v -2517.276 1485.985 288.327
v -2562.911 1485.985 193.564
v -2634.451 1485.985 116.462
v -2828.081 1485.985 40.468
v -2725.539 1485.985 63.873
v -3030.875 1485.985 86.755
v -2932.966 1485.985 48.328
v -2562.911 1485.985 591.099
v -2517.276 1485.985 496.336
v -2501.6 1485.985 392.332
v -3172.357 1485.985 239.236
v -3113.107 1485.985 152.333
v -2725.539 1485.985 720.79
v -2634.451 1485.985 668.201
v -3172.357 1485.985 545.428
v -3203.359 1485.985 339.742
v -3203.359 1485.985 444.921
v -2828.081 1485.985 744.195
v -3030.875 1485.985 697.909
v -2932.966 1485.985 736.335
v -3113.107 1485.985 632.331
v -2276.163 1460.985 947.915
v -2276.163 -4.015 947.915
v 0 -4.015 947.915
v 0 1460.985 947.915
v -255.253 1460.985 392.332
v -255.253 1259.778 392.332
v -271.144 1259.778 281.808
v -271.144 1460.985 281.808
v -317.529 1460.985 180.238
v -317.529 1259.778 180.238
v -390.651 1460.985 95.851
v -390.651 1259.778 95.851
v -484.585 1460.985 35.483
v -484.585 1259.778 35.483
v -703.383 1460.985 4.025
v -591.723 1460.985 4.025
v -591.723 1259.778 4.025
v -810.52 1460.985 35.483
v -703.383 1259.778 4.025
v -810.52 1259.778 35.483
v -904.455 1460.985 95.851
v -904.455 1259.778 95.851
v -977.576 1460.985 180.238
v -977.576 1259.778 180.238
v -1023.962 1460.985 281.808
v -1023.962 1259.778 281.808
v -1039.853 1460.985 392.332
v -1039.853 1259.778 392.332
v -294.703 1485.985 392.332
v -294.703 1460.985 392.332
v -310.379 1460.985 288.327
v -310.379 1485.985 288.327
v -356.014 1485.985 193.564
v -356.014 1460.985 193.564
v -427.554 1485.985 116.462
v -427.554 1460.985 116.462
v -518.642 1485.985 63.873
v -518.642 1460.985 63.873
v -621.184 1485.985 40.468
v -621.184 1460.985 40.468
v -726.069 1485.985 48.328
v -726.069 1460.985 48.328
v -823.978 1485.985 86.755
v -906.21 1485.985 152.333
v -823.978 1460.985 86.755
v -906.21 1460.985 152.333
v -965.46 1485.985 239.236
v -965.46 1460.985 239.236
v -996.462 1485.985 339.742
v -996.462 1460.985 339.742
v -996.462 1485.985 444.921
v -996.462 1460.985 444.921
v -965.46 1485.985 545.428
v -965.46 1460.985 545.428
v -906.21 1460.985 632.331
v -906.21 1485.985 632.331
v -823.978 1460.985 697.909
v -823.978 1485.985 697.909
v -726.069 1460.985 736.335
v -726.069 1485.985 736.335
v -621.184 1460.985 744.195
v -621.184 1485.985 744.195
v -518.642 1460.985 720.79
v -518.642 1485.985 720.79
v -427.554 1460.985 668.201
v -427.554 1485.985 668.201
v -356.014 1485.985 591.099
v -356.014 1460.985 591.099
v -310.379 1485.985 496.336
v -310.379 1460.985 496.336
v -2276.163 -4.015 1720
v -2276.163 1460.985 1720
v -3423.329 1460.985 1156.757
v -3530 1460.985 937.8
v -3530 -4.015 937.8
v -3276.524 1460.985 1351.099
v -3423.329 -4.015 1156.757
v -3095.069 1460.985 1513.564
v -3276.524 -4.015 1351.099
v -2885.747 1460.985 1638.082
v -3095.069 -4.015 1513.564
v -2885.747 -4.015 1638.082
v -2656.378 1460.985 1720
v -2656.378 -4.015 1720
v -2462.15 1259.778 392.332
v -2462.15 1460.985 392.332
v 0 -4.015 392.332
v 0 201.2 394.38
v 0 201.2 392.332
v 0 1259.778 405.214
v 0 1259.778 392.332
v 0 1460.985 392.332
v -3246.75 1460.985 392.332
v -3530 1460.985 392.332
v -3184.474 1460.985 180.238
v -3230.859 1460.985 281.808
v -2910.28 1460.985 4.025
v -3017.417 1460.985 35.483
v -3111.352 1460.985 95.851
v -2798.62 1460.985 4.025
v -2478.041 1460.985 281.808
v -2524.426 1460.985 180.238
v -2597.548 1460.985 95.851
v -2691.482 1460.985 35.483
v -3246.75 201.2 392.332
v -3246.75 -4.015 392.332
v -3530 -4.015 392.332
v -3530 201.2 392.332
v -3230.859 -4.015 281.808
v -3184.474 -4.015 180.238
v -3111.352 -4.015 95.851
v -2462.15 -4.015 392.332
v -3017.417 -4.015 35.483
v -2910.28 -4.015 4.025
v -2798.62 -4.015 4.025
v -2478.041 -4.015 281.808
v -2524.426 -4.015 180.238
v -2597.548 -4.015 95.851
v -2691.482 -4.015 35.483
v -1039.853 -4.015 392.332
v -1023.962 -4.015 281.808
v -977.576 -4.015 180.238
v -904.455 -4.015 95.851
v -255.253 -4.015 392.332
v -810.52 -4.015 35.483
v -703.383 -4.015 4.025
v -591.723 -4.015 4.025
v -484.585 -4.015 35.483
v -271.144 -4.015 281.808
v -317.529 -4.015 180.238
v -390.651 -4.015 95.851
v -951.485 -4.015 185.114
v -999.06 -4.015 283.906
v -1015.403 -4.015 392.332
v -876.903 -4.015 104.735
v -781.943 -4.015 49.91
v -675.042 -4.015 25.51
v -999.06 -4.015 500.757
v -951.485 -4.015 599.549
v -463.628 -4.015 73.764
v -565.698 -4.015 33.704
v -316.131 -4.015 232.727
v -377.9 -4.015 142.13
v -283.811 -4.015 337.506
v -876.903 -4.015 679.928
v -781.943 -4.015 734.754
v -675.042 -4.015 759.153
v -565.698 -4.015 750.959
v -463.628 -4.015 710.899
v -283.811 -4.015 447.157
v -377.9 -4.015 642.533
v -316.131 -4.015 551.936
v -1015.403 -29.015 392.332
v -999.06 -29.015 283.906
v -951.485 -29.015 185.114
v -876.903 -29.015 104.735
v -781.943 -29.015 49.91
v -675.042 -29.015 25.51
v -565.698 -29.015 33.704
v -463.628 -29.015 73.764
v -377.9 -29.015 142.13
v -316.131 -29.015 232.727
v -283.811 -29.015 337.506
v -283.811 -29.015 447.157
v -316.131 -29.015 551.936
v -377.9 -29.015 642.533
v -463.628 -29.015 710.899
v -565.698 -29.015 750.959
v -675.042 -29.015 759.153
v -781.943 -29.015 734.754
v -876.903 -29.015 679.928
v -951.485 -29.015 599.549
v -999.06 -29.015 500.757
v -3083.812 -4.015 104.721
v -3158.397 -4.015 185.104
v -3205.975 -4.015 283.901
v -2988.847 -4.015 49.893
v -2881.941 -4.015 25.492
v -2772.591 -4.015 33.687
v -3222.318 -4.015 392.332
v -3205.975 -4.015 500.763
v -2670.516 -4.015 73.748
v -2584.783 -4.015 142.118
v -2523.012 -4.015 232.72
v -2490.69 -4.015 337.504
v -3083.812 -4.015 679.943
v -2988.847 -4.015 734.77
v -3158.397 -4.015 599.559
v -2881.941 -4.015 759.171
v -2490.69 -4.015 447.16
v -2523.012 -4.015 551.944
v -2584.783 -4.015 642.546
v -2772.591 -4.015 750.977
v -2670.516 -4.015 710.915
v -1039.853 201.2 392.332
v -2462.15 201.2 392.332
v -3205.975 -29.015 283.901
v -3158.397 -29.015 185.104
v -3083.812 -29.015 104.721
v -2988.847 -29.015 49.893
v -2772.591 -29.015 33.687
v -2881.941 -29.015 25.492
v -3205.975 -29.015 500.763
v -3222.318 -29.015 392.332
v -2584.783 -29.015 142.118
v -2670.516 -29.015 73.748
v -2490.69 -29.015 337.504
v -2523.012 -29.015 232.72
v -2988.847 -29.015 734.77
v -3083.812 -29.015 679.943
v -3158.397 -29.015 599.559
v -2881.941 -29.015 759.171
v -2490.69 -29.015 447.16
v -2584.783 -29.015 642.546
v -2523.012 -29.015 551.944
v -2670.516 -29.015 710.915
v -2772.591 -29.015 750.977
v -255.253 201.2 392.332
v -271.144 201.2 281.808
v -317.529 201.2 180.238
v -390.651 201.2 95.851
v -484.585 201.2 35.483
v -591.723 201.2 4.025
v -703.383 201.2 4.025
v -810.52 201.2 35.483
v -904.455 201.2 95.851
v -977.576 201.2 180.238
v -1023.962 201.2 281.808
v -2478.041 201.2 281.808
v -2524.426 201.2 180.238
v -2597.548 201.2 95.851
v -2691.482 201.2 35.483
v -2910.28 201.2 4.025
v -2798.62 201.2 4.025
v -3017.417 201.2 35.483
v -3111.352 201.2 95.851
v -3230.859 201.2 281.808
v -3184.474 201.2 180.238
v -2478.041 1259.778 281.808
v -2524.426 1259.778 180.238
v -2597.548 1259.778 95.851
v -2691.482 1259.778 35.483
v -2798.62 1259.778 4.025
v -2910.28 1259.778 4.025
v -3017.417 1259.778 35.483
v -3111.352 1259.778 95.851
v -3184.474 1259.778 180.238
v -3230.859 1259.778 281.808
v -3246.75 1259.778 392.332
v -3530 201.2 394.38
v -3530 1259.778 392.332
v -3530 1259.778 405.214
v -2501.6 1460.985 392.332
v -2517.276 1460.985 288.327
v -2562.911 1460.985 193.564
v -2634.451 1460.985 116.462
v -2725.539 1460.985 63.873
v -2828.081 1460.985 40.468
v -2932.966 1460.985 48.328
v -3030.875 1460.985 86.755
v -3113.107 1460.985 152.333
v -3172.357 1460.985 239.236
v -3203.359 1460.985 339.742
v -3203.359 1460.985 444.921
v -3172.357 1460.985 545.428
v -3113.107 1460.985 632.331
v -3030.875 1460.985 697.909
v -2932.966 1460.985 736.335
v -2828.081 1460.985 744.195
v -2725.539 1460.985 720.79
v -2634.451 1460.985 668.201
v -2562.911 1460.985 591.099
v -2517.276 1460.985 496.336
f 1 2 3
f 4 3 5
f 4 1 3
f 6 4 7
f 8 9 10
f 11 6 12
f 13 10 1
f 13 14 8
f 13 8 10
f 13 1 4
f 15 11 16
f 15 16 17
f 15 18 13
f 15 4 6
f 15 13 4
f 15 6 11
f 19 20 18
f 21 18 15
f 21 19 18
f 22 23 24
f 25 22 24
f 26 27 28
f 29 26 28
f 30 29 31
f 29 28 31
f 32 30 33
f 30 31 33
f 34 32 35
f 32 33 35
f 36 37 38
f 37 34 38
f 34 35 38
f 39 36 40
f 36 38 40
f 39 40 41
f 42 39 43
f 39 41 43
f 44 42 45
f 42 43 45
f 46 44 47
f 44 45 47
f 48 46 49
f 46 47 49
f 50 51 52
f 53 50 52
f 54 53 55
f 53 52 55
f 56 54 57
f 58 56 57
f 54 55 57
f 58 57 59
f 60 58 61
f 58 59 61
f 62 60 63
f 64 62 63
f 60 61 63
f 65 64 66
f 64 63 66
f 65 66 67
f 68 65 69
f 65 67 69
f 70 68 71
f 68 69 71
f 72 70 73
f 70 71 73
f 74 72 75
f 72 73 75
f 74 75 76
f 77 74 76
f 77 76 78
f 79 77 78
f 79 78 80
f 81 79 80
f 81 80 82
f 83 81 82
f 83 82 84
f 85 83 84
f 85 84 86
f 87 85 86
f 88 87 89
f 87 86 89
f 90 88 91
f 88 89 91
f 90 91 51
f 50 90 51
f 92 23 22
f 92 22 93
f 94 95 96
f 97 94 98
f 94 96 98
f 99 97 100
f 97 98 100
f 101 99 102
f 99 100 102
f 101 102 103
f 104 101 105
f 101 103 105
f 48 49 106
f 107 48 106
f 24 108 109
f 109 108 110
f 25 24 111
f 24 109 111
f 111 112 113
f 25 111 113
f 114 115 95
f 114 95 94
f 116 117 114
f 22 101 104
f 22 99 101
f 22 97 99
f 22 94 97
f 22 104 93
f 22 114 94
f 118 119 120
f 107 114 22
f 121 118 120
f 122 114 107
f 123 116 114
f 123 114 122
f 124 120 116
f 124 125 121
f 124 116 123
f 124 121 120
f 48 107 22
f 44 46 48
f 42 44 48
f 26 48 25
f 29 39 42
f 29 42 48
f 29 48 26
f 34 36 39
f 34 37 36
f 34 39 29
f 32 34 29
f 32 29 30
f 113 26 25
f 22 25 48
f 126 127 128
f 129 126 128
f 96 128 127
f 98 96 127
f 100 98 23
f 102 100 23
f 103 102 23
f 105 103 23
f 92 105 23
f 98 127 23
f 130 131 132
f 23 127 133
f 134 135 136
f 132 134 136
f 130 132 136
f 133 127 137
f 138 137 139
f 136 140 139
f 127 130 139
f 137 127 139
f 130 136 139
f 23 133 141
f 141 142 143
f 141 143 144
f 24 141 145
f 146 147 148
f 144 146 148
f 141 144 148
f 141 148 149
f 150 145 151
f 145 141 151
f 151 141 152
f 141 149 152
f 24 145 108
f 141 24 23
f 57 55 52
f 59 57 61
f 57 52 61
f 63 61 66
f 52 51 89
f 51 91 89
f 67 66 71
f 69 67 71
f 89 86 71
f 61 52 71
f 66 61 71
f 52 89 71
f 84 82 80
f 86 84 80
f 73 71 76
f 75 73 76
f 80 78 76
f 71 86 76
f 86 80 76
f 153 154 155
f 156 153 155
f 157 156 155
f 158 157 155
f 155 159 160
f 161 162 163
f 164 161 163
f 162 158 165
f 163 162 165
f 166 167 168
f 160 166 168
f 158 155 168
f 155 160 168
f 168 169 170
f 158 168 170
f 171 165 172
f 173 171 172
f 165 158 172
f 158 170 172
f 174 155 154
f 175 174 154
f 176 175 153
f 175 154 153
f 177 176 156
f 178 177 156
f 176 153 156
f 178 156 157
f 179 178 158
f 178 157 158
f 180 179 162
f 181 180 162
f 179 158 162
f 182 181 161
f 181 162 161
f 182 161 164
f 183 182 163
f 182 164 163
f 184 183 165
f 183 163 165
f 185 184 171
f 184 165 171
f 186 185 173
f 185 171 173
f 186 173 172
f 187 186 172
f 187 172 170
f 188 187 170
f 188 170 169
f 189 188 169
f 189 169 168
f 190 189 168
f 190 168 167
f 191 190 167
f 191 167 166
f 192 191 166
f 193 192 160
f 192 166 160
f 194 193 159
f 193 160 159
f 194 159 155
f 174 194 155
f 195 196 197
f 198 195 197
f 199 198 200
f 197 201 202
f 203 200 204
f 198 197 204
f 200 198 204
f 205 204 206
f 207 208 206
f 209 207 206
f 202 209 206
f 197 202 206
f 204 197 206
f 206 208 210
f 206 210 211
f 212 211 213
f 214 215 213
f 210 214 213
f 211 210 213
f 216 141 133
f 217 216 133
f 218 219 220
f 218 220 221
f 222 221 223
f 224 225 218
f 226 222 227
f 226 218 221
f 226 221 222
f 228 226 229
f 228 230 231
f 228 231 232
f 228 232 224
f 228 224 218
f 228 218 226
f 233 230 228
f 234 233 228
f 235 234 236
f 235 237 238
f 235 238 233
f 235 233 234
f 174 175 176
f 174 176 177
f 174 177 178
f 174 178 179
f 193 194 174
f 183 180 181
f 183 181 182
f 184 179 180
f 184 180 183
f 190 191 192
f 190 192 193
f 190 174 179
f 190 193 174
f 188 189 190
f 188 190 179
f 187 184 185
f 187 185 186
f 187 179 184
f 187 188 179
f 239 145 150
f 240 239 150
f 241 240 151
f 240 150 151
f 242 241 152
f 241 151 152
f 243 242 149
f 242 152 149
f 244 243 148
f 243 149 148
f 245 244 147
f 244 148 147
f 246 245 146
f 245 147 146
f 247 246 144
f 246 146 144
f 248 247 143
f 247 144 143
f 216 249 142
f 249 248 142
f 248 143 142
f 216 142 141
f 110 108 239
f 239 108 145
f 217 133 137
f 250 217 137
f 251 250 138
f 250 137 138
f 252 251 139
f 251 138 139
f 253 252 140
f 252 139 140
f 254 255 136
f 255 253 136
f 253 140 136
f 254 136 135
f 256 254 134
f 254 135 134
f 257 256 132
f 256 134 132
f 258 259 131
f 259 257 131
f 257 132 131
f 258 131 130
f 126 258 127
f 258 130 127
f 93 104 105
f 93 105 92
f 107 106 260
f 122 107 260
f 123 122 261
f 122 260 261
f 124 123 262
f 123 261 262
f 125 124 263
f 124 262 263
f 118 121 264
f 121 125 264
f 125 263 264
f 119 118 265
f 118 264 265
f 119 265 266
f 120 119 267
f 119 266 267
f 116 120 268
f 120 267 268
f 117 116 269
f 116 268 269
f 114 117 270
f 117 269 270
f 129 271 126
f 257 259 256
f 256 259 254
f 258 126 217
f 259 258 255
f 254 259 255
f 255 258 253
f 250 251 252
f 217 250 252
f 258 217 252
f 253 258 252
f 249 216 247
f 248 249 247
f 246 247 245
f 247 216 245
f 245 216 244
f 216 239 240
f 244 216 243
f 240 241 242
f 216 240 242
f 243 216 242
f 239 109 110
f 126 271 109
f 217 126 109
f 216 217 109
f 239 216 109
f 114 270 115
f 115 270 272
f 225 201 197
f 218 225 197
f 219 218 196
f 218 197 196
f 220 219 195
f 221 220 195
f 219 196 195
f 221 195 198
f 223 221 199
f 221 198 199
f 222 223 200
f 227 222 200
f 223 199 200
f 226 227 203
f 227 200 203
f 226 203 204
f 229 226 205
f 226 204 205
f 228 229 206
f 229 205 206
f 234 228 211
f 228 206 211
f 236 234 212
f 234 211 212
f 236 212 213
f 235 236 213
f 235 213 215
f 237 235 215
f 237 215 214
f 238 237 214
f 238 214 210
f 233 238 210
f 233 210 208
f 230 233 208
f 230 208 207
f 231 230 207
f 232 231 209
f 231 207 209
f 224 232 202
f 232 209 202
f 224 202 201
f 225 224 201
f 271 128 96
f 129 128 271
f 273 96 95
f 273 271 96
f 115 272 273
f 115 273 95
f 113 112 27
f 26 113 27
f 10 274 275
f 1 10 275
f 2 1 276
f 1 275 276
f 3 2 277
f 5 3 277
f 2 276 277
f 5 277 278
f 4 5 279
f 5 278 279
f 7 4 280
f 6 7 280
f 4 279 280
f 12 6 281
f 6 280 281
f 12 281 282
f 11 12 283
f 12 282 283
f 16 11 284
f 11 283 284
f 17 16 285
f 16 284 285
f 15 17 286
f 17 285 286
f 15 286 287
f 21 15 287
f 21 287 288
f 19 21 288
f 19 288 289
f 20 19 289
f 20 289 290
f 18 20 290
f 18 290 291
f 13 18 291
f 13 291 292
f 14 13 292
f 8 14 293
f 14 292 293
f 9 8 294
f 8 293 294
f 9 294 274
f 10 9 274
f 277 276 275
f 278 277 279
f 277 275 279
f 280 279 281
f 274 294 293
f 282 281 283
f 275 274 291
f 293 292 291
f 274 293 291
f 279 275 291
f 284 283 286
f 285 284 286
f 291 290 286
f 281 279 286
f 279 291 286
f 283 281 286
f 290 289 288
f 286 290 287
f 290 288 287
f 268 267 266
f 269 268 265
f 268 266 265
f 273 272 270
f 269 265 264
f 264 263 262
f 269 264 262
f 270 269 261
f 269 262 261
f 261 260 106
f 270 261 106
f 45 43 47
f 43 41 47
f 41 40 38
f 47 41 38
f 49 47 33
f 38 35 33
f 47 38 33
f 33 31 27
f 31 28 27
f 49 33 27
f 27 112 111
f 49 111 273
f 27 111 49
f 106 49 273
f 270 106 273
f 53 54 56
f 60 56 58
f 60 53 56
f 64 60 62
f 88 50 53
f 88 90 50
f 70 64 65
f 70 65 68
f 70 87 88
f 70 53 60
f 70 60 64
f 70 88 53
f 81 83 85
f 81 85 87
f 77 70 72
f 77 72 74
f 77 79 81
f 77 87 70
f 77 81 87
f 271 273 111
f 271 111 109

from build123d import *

# Parameters (mm, degrees)
F0_W     = 3530
F0_H     = 1465
F1_DEPTH = 1720
F4_DEPTH = 3600
F2_W     = 2276.1628627777
F2_H     = 772.0854592323
F5_DEPTH = 2000
F7_DEPTH = 25
F9_DEPTH = 25


with BuildPart() as f1:
    # F0 (on Top) → F1 (new body)
    with BuildSketch(Plane.XY):
        with Locations((-1765, 728.4852225147)):
            Rectangle(F0_W, F0_H)
    extrude(amount=F1_DEPTH)

    # F3 (on face) → F4 (cut)
    with BuildSketch(Plane.YZ):
        Polygon((201.2, 394.3797231357), (201.2, 0), (1259.7781419754, 0), (1259.7781419754, 405.2137233015), align=None)
    extrude(amount=-F4_DEPTH, mode=Mode.SUBTRACT)

    # F2 (on face) → F5 (cut)
    with BuildSketch(Plane.XZ.offset(4.0147774853)):
        with BuildLine():
            Line((-3530, 392.3316299915), (-3530, 0))
            Line((-3530, 0), (0, 0))
            Line((0, 0), (0, 392.3316299915))
            Line((0, 392.3316299915), (-255.252728653, 392.3316299915))
            ThreePointArc((-255.252728653, 392.3316299915), (-647.552728653, 0.0316299915), (-1039.852728653, 392.3316299915))
            Line((-1039.852728653, 392.3316299915), (-2462.1497489929, 392.3316299915))
            ThreePointArc((-2462.1497489929, 392.3316299915), (-2854.4497489929, 0.0316299915), (-3246.7497489929, 392.3316299915))
            Line((-3246.7497489929, 392.3316299915), (-3530, 392.3316299915))
        make_face()
        with Locations((-1138.0814313889, 1333.9572703838)):
            Rectangle(F2_W, F2_H)
        with BuildLine():
            Line((-3530, 1720), (-3530, 937.7999901772))
            ThreePointArc((-3530, 937.7999901772), (-3189.7313507359, 1436.7261664282), (-2656.3777923584, 1720))
            Line((-2656.3777923584, 1720), (-3530, 1720))
        make_face()
    extrude(amount=-F5_DEPTH, mode=Mode.SUBTRACT)


with BuildPart() as f7:
    # F6 (on face) → F7 (new body)
    with BuildSketch(Plane.XZ.offset(4.0147774853)):
        with BuildLine():
            Line((-3222.3179076584, 392.3316299915), (-2486.5815903274, 392.3316299915))
            ThreePointArc((-2486.5815903274, 392.3316299915), (-2854.4497489929, 760.199788657), (-3222.3179076584, 392.3316299915))
        make_face()
        with BuildLine():
            ThreePointArc((-3222.3179076584, 392.3316299915), (-2854.4497489929, 24.4634713261), (-2486.5815903274, 392.3316299915))
            Line((-2486.5815903274, 392.3316299915), (-3222.3179076584, 392.3316299915))
        make_face()
    extrude(amount=F7_DEPTH)


with BuildPart() as f7b:
    # F6 (on face) → F7, piece 2 (new body)
    with BuildSketch(Plane.XZ.offset(4.0147774853)):
        with BuildLine():
            ThreePointArc((-279.702728653, 392.3316299915), (-647.552728653, 760.1816299915), (-1015.402728653, 392.3316299915))
            Line((-1015.402728653, 392.3316299915), (-279.702728653, 392.3316299915))
        make_face()
        with BuildLine():
            Line((-279.702728653, 392.3316299915), (-1015.402728653, 392.3316299915))
            ThreePointArc((-1015.402728653, 392.3316299915), (-647.552728653, 24.4816299915), (-279.702728653, 392.3316299915))
        make_face()
    extrude(amount=F7_DEPTH)


with BuildPart() as f9:
    # F8 (on face) → F9 (new body)
    with BuildSketch(Plane(origin=(0, 1460.9852225147, 0), x_dir=(-1, 0, 0), z_dir=(0, 1, 0))):
        with BuildLine():
            Line((294.702728653, 392.3316299915), (1000.402728653, 392.3316299915))
            ThreePointArc((1000.402728653, 392.3316299915), (647.552728653, 745.1816299915), (294.702728653, 392.3316299915))
        make_face()
        with BuildLine():
            ThreePointArc((294.702728653, 392.3316299915), (647.552728653, 39.4816299915), (1000.402728653, 392.3316299915))
            Line((1000.402728653, 392.3316299915), (294.702728653, 392.3316299915))
        make_face()
    extrude(amount=F9_DEPTH)


with BuildPart() as f9b:
    # F8 (on face) → F9, piece 2 (new body)
    with BuildSketch(Plane(origin=(0, 1460.9852225147, 0), x_dir=(-1, 0, 0), z_dir=(0, 1, 0))):
        with BuildLine():
            ThreePointArc((3207.2997489929, 392.3316299915), (2854.4497489929, 745.1816299915), (2501.5997489929, 392.3316299915))
            Line((2501.5997489929, 392.3316299915), (3207.2997489929, 392.3316299915))
        make_face()
        with BuildLine():
            Line((3207.2997489929, 392.3316299915), (2501.5997489929, 392.3316299915))
            ThreePointArc((2501.5997489929, 392.3316299915), (2854.4497489929, 39.4816299915), (3207.2997489929, 392.3316299915))
        make_face()
    extrude(amount=F9_DEPTH)


solid = Compound([f1.part, f7.part, f7b.part, f9.part, f9b.part])
